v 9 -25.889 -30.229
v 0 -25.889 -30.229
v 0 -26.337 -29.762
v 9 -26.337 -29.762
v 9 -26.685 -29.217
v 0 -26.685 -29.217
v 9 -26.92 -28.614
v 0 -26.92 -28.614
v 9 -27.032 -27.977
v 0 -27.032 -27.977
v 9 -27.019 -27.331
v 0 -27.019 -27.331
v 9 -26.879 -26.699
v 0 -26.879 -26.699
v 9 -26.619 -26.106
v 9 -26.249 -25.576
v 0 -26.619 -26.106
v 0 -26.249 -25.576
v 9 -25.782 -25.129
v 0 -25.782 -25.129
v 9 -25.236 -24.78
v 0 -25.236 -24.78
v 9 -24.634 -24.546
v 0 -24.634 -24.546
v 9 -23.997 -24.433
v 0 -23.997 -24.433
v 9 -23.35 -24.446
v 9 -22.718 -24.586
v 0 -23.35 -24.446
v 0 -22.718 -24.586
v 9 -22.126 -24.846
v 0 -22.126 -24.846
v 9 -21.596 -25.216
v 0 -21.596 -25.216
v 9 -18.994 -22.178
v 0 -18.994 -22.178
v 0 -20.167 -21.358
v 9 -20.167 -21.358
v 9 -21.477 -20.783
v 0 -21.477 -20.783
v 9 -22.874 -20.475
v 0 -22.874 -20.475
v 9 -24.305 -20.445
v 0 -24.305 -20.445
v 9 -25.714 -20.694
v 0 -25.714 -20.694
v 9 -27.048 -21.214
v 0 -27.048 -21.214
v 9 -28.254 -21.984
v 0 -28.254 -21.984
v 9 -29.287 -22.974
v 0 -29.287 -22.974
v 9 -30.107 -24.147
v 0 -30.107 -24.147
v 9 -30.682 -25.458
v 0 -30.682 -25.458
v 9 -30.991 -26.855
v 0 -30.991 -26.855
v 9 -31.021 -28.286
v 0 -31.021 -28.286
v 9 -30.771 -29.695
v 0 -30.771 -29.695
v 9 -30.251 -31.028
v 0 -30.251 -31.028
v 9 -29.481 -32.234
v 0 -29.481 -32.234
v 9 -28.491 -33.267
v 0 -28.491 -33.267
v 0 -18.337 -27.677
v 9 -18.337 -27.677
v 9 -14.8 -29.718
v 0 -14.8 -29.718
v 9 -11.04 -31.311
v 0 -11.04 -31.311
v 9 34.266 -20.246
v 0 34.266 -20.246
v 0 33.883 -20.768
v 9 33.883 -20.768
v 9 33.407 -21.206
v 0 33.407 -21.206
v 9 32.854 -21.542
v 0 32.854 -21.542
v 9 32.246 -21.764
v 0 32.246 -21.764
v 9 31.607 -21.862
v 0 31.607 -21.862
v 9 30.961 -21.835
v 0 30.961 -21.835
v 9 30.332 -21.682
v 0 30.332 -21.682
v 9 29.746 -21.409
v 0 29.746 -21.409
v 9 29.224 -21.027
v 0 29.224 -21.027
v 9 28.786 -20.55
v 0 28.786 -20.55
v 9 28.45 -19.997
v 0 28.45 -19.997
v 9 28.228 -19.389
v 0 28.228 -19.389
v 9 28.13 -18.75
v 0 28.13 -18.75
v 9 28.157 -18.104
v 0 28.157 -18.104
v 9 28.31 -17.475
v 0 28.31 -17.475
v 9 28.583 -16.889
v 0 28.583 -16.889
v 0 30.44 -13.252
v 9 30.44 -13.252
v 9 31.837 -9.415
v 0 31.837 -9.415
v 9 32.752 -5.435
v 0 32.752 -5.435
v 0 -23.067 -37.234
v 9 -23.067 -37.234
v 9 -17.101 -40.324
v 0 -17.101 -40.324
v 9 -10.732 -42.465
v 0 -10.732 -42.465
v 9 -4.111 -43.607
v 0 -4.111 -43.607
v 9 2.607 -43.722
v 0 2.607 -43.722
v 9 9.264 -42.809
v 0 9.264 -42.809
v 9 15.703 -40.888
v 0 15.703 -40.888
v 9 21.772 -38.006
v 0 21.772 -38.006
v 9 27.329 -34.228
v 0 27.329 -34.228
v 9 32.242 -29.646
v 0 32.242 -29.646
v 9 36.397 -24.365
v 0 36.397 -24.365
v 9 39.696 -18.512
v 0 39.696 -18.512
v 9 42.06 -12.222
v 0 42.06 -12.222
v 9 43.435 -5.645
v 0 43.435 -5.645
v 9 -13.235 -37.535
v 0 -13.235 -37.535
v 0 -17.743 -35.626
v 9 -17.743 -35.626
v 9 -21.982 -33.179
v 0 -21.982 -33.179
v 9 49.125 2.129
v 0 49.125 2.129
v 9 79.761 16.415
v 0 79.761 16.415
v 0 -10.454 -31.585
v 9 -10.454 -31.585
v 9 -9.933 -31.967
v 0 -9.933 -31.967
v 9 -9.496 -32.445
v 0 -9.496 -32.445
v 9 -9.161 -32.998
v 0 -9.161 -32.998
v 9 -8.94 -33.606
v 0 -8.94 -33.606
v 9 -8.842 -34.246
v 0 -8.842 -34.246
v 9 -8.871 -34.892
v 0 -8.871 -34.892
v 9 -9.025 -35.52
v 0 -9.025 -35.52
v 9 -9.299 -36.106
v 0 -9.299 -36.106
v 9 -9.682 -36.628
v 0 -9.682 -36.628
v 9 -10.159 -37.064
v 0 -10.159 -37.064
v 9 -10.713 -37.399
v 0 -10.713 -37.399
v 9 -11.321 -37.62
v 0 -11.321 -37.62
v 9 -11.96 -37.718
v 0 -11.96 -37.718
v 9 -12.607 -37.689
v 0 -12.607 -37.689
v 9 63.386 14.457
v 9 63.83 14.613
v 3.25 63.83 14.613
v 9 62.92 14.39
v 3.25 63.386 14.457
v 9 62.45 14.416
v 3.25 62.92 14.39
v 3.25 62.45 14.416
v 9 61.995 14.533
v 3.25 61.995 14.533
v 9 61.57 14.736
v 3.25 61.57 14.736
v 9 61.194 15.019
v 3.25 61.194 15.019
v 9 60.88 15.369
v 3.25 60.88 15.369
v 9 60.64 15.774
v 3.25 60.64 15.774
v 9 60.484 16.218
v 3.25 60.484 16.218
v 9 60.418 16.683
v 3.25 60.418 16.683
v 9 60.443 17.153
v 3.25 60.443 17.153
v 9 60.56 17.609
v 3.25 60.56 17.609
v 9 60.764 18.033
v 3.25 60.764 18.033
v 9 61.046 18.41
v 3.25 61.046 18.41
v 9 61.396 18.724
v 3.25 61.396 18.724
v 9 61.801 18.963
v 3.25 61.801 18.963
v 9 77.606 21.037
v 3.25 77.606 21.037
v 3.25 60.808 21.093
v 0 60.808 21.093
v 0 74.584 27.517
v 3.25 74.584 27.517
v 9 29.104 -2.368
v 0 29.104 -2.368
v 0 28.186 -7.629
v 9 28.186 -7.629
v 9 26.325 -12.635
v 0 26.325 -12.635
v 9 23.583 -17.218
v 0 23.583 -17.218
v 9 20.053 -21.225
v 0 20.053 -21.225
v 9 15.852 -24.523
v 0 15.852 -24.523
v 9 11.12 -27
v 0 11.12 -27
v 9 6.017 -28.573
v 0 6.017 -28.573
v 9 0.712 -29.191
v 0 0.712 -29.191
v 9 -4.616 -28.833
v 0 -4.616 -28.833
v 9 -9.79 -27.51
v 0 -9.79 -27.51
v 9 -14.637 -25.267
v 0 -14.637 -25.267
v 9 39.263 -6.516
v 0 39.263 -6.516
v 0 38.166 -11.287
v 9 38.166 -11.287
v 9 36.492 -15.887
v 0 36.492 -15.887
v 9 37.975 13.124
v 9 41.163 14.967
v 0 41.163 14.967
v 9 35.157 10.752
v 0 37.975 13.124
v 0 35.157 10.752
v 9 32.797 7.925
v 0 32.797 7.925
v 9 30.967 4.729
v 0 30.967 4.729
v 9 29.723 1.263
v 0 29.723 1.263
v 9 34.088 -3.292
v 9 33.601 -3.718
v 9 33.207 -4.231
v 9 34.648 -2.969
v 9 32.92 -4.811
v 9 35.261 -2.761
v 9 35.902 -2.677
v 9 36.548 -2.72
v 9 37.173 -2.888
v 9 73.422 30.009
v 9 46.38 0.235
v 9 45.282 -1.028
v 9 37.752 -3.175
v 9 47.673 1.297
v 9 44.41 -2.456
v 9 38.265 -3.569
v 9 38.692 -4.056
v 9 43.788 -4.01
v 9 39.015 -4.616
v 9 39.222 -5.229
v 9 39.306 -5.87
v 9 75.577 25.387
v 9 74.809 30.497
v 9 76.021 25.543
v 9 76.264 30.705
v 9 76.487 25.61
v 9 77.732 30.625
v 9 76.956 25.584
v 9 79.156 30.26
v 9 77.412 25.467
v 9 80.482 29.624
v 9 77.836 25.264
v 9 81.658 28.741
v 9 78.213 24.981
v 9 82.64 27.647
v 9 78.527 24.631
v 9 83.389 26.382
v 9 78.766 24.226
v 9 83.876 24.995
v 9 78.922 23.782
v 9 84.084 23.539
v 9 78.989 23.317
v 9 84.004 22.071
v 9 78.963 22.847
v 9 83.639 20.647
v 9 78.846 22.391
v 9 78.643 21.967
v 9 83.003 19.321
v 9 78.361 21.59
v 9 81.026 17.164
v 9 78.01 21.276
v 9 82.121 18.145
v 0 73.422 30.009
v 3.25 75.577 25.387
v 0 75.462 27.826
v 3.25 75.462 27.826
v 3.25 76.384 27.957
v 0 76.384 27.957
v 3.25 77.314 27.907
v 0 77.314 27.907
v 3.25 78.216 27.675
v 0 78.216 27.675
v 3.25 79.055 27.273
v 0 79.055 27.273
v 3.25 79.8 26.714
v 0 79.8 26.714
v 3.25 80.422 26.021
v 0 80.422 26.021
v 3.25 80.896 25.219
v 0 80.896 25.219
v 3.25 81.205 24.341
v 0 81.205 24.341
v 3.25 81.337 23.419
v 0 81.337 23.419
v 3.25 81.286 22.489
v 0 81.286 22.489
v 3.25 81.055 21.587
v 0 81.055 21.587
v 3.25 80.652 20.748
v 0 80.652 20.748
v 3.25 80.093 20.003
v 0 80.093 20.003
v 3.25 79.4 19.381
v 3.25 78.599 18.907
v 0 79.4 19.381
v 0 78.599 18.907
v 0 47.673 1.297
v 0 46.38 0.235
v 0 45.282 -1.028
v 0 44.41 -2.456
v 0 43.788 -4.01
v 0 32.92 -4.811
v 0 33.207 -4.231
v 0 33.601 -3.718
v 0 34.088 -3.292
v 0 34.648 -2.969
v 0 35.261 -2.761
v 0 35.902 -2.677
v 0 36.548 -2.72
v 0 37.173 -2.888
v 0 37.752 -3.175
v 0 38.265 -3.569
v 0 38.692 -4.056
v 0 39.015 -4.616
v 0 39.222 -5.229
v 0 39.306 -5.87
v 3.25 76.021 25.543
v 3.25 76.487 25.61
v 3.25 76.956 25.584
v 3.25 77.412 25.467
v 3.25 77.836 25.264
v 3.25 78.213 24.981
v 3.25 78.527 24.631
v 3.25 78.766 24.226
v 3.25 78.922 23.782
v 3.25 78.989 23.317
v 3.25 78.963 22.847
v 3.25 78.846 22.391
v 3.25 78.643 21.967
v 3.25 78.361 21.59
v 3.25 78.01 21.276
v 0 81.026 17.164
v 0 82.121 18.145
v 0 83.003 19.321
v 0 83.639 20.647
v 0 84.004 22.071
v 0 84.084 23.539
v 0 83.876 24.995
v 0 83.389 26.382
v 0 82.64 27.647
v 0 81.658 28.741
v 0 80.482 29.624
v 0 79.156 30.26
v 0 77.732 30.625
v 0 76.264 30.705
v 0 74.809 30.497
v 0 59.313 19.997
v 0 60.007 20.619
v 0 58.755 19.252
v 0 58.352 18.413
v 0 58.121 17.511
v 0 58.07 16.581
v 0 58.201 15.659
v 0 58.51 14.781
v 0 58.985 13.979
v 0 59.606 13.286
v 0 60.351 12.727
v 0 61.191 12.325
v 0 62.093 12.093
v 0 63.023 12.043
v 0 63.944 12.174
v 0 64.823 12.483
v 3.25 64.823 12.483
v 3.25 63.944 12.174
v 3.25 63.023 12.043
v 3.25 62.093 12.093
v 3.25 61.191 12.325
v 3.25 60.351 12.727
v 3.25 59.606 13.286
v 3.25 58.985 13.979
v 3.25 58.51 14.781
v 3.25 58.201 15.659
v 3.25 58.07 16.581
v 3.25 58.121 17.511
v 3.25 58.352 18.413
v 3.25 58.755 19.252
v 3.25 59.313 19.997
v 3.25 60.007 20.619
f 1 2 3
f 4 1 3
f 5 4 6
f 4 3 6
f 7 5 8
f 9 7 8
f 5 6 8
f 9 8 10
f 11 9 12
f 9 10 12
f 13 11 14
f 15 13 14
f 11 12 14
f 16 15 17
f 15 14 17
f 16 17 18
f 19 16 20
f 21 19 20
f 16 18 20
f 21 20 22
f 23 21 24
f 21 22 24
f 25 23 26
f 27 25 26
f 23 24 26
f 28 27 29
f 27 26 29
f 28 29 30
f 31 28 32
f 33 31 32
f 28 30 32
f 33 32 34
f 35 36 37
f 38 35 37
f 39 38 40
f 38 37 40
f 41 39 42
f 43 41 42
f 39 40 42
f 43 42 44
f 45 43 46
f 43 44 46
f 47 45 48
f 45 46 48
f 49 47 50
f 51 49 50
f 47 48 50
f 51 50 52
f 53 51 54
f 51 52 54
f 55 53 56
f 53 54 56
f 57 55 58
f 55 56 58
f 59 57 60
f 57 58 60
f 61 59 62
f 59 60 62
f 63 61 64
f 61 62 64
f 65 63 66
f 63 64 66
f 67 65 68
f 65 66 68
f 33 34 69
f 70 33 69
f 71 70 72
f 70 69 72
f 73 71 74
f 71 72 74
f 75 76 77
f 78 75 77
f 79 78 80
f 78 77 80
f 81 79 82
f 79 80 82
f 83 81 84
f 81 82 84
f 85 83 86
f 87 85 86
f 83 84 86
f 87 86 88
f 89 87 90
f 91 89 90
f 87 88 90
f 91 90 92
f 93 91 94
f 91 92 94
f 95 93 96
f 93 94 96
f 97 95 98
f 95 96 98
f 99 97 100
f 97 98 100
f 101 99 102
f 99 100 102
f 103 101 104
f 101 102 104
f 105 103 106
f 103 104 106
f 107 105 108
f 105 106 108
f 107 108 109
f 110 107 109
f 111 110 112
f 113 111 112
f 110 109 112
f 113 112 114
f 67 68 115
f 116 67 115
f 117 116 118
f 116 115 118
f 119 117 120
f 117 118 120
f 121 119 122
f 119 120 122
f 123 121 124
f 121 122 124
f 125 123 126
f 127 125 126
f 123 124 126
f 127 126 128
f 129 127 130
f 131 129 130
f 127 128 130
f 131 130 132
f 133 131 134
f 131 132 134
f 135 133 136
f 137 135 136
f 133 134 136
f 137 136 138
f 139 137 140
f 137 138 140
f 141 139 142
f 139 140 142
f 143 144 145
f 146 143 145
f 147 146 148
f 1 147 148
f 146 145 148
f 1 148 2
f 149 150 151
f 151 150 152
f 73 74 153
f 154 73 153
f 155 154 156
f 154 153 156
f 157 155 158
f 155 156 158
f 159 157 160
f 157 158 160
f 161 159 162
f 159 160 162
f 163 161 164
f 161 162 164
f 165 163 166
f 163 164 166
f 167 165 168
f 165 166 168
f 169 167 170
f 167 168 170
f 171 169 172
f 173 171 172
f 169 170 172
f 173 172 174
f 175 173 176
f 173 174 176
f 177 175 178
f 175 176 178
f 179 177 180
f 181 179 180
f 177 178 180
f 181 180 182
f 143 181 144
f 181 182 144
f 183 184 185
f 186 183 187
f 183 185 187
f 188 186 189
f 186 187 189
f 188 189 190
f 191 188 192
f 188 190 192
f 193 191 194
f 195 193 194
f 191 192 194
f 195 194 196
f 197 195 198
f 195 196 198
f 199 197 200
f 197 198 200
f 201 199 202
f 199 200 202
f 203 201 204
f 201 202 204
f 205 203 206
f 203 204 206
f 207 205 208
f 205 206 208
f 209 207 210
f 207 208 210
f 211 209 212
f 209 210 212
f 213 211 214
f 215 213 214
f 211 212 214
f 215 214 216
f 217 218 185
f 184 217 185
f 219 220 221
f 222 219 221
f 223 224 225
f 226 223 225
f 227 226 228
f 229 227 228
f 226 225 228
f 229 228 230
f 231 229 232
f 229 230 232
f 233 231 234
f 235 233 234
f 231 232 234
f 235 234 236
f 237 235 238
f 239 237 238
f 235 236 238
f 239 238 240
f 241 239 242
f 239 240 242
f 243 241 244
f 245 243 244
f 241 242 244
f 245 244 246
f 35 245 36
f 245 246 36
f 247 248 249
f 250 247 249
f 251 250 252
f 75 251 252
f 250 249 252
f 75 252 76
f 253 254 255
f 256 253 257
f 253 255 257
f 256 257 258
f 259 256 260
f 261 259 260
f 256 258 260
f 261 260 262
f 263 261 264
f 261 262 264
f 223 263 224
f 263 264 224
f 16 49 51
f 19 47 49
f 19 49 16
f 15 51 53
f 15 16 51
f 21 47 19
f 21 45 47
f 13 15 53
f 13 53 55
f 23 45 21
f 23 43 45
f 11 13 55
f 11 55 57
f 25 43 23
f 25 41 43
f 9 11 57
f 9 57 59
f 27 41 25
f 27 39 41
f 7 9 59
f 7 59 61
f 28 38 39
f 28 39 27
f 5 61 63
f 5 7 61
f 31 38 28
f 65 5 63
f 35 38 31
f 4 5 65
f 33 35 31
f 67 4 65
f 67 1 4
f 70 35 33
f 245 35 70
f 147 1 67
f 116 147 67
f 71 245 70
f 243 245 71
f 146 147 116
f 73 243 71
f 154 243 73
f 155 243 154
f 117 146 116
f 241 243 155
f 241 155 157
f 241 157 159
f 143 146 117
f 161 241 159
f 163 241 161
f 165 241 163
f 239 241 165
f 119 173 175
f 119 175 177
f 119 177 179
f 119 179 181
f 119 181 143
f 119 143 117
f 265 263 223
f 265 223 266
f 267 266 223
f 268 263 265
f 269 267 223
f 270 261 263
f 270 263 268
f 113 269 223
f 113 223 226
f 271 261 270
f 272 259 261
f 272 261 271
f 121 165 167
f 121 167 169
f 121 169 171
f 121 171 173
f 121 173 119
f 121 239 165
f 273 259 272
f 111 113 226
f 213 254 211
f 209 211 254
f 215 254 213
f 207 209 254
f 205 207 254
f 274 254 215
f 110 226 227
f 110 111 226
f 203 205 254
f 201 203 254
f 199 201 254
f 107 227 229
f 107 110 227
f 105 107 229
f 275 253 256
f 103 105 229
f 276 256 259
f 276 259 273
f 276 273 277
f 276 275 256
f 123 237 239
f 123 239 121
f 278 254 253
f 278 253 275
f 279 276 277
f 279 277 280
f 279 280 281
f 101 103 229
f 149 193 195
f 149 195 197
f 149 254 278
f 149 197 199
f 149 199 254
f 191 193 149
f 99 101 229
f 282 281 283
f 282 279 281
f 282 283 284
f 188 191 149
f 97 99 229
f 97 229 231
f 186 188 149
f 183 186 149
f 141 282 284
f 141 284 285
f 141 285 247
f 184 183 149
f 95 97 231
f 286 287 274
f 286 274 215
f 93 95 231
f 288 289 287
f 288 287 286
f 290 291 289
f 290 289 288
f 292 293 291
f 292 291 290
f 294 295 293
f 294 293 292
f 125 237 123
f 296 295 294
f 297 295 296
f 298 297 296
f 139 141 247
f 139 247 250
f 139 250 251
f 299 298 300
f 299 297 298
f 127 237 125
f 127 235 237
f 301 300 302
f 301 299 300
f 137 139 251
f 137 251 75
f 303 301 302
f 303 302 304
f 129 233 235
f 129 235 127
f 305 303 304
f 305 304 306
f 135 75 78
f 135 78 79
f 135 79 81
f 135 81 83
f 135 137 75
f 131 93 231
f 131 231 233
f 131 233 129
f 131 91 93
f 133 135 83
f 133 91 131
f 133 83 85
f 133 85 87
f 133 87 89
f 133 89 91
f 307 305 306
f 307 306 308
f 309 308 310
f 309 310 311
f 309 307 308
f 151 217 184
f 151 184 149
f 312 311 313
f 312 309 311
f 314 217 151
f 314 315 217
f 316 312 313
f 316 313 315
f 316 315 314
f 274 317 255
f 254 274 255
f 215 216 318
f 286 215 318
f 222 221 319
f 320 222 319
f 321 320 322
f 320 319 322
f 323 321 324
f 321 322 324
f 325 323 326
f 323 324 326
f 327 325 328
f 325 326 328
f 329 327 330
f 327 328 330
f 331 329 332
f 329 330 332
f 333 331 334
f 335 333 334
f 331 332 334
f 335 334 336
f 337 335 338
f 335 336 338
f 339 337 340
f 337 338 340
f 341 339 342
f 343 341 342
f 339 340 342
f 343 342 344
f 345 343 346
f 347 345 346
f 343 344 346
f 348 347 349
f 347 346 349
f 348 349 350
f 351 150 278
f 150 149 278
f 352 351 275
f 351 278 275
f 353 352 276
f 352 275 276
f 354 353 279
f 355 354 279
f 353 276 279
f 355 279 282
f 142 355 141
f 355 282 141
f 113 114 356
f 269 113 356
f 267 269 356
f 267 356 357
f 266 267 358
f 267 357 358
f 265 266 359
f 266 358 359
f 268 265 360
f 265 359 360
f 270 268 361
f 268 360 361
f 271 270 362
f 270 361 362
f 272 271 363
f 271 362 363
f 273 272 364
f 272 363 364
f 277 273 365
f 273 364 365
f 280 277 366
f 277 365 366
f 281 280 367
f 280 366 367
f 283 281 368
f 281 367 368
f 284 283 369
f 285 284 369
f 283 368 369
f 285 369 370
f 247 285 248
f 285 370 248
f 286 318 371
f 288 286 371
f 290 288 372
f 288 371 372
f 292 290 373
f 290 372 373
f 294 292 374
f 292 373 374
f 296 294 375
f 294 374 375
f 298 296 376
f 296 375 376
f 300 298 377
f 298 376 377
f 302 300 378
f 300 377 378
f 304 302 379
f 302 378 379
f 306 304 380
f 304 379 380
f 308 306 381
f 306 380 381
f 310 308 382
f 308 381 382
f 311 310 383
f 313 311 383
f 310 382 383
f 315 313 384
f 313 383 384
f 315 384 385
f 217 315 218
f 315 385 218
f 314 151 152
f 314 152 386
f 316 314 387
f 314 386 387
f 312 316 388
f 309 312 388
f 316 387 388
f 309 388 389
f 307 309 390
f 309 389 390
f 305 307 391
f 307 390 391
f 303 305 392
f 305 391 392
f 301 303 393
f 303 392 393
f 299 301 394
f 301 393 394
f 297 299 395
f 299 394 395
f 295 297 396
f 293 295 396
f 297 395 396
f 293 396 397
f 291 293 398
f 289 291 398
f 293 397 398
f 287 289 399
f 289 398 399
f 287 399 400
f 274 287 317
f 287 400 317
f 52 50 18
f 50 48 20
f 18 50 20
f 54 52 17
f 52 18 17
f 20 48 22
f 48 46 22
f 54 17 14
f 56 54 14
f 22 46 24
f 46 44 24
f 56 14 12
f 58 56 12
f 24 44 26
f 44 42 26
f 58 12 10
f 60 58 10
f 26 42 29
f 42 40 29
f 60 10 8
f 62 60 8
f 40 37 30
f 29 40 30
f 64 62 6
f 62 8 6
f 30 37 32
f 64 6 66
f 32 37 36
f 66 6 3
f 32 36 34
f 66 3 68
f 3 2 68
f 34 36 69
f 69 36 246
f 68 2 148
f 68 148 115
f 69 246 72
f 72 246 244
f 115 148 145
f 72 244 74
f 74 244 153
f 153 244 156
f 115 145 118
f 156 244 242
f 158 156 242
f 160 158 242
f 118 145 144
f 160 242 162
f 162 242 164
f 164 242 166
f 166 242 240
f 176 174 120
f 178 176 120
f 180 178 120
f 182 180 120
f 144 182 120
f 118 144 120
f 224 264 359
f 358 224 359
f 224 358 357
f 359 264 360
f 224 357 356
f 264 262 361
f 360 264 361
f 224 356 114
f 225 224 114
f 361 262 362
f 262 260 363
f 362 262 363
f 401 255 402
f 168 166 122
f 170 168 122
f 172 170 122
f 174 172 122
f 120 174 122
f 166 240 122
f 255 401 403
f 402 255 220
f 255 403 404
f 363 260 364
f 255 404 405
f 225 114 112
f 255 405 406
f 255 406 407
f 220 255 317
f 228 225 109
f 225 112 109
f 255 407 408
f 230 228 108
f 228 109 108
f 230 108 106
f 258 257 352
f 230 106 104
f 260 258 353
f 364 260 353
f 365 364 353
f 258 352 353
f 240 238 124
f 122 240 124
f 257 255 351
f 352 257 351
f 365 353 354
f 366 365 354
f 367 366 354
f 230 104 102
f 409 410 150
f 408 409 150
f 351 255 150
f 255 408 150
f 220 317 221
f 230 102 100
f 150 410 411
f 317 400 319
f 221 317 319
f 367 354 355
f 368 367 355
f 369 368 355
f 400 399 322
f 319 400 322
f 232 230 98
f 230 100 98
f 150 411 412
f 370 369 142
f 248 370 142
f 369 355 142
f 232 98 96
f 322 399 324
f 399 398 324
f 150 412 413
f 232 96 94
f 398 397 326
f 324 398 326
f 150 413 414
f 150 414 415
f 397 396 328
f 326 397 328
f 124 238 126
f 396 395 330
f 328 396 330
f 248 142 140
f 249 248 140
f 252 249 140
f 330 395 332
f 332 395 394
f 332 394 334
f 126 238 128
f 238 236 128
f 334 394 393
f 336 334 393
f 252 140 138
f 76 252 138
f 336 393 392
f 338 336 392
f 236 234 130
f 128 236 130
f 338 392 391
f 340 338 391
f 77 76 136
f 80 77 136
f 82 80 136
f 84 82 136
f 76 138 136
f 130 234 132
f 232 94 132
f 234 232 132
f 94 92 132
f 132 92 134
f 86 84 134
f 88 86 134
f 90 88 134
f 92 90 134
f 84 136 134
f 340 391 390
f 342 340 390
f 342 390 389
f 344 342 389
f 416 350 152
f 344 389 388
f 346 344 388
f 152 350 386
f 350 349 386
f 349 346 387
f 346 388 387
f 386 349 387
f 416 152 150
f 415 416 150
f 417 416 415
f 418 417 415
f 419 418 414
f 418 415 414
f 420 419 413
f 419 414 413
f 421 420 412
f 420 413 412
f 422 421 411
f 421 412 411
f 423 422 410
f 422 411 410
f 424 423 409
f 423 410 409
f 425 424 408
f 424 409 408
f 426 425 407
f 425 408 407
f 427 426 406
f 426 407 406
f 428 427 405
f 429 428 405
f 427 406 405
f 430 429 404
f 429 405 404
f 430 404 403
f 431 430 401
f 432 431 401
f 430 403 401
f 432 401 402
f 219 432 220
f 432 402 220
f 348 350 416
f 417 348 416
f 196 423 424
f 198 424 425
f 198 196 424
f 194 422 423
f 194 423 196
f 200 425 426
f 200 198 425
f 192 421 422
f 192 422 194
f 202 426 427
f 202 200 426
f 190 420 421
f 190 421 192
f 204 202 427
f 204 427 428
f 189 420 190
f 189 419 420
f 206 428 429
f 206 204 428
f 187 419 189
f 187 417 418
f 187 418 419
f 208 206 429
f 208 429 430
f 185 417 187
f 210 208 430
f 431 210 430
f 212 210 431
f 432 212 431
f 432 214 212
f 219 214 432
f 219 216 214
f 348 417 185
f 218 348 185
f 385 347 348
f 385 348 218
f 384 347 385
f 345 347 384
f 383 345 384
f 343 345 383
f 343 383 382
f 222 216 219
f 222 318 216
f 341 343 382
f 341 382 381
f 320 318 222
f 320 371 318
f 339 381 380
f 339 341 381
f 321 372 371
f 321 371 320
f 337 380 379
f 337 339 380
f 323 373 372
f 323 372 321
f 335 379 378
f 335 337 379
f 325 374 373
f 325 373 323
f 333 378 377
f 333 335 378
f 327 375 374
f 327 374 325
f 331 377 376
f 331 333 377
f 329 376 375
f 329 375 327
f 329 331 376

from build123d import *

# Parameters (mm, degrees)
BOSS_EXTRUDE1_DEPTH = 9
FILLET1_R           = 10
CUT_EXTRUDE1_DEPTH  = 3.25


with BuildPart() as part:
    # Sketch2 → Boss-Extrude1 (new body)
    with BuildSketch(Plane(origin=(0, 0, 0), x_dir=(0, 0, -1), z_dir=(1, 0, 0))):
        with BuildLine():
            Line((-30.009207192, 73.421599264), (-14.966983891, 41.163447295))
            ThreePointArc((-14.966983891, 41.163447295), (-7.925043754, 32.797065521), (2.36792839, 29.103829905))
            ThreePointArc((2.36792839, 29.103829905), (26.999530596, 11.120492238), (22.178254162, -18.993815897))
            ThreePointArc((22.178254162, -18.993815897), (22.974363729, -29.286833411), (33.267381244, -28.490723845))
            ThreePointArc((33.267381244, -28.490723845), (39.862888041, 18.149108987), (0.354910699, 43.798562059))
            Line((0.354910699, 43.798562059), (-16.414590386, 79.76087319))
            ThreePointArc((-16.414590386, 79.76087319), (-26.381535752, 83.388544629), (-30.009207192, 73.421599264))
        make_face()
        with BuildLine():
            ThreePointArc((-14.612962522, 63.829641692), (-15.773817383, 60.640219175), (-18.9632399, 61.801074036))
            Line((-18.9632399, 61.801074036), (-25.387037478, 75.576952399))
            ThreePointArc((-25.387037478, 75.576952399), (-24.226182617, 78.766374916), (-21.0367601, 77.605520055))
            Line((-21.0367601, 77.605520055), (-14.612962522, 63.829641692))
        make_face(mode=Mode.SUBTRACT)
        with BuildLine():
            ThreePointArc((5.435407174, 32.75204343), (2.720199354, 36.547784002), (6.515939926, 39.262991823))
            ThreePointArc((6.515939926, 39.262991823), (13.612401704, 37.399766307), (20.246265091, 34.265562156))
            ThreePointArc((20.246265091, 34.265562156), (21.408669119, 29.745737284), (16.888844247, 28.583333256))
            ThreePointArc((16.888844247, 28.583333256), (11.355068758, 31.19779501), (5.435407174, 32.75204343))
        make_face(mode=Mode.SUBTRACT)
        with BuildLine():
            ThreePointArc((30.229264235, -25.888831256), (25.576256317, -26.248716403), (25.216371171, -21.595708485))
            ThreePointArc((25.216371171, -21.595708485), (28.752043406, -16.6), (31.310617746, -11.040163783))
            ThreePointArc((31.310617746, -11.040163783), (35.52018338, -9.025329503), (37.53501766, -13.234895137))
            ThreePointArc((37.53501766, -13.234895137), (34.467811071, -19.9), (30.229264235, -25.888831256))
        make_face(mode=Mode.SUBTRACT)
    extrude(amount=BOSS_EXTRUDE1_DEPTH)

    # Fillet1
    fillet1_edges = [part.edges().sort_by_distance(p)[0] for p in [
        (4.5, 43.798562059, -0.354910699),
    ]]
    fillet(fillet1_edges, radius=FILLET1_R)

    # Sketch3 → Cut-Extrude1 (cut)
    with BuildSketch(Plane.ZY):
        with BuildLine():
            Line((21.093063199, 60.80792112), (27.516860778, 74.583799483))
            ThreePointArc((27.516860778, 74.583799483), (25.219335532, 80.896198215), (18.906936801, 78.59867297))
            Line((18.906936801, 78.59867297), (12.483139222, 64.822794607))
            ThreePointArc((12.483139222, 64.822794607), (14.780664468, 58.510395875), (21.093063199, 60.80792112))
        make_face()
    extrude(amount=-CUT_EXTRUDE1_DEPTH, mode=Mode.SUBTRACT)


solid = part.part
